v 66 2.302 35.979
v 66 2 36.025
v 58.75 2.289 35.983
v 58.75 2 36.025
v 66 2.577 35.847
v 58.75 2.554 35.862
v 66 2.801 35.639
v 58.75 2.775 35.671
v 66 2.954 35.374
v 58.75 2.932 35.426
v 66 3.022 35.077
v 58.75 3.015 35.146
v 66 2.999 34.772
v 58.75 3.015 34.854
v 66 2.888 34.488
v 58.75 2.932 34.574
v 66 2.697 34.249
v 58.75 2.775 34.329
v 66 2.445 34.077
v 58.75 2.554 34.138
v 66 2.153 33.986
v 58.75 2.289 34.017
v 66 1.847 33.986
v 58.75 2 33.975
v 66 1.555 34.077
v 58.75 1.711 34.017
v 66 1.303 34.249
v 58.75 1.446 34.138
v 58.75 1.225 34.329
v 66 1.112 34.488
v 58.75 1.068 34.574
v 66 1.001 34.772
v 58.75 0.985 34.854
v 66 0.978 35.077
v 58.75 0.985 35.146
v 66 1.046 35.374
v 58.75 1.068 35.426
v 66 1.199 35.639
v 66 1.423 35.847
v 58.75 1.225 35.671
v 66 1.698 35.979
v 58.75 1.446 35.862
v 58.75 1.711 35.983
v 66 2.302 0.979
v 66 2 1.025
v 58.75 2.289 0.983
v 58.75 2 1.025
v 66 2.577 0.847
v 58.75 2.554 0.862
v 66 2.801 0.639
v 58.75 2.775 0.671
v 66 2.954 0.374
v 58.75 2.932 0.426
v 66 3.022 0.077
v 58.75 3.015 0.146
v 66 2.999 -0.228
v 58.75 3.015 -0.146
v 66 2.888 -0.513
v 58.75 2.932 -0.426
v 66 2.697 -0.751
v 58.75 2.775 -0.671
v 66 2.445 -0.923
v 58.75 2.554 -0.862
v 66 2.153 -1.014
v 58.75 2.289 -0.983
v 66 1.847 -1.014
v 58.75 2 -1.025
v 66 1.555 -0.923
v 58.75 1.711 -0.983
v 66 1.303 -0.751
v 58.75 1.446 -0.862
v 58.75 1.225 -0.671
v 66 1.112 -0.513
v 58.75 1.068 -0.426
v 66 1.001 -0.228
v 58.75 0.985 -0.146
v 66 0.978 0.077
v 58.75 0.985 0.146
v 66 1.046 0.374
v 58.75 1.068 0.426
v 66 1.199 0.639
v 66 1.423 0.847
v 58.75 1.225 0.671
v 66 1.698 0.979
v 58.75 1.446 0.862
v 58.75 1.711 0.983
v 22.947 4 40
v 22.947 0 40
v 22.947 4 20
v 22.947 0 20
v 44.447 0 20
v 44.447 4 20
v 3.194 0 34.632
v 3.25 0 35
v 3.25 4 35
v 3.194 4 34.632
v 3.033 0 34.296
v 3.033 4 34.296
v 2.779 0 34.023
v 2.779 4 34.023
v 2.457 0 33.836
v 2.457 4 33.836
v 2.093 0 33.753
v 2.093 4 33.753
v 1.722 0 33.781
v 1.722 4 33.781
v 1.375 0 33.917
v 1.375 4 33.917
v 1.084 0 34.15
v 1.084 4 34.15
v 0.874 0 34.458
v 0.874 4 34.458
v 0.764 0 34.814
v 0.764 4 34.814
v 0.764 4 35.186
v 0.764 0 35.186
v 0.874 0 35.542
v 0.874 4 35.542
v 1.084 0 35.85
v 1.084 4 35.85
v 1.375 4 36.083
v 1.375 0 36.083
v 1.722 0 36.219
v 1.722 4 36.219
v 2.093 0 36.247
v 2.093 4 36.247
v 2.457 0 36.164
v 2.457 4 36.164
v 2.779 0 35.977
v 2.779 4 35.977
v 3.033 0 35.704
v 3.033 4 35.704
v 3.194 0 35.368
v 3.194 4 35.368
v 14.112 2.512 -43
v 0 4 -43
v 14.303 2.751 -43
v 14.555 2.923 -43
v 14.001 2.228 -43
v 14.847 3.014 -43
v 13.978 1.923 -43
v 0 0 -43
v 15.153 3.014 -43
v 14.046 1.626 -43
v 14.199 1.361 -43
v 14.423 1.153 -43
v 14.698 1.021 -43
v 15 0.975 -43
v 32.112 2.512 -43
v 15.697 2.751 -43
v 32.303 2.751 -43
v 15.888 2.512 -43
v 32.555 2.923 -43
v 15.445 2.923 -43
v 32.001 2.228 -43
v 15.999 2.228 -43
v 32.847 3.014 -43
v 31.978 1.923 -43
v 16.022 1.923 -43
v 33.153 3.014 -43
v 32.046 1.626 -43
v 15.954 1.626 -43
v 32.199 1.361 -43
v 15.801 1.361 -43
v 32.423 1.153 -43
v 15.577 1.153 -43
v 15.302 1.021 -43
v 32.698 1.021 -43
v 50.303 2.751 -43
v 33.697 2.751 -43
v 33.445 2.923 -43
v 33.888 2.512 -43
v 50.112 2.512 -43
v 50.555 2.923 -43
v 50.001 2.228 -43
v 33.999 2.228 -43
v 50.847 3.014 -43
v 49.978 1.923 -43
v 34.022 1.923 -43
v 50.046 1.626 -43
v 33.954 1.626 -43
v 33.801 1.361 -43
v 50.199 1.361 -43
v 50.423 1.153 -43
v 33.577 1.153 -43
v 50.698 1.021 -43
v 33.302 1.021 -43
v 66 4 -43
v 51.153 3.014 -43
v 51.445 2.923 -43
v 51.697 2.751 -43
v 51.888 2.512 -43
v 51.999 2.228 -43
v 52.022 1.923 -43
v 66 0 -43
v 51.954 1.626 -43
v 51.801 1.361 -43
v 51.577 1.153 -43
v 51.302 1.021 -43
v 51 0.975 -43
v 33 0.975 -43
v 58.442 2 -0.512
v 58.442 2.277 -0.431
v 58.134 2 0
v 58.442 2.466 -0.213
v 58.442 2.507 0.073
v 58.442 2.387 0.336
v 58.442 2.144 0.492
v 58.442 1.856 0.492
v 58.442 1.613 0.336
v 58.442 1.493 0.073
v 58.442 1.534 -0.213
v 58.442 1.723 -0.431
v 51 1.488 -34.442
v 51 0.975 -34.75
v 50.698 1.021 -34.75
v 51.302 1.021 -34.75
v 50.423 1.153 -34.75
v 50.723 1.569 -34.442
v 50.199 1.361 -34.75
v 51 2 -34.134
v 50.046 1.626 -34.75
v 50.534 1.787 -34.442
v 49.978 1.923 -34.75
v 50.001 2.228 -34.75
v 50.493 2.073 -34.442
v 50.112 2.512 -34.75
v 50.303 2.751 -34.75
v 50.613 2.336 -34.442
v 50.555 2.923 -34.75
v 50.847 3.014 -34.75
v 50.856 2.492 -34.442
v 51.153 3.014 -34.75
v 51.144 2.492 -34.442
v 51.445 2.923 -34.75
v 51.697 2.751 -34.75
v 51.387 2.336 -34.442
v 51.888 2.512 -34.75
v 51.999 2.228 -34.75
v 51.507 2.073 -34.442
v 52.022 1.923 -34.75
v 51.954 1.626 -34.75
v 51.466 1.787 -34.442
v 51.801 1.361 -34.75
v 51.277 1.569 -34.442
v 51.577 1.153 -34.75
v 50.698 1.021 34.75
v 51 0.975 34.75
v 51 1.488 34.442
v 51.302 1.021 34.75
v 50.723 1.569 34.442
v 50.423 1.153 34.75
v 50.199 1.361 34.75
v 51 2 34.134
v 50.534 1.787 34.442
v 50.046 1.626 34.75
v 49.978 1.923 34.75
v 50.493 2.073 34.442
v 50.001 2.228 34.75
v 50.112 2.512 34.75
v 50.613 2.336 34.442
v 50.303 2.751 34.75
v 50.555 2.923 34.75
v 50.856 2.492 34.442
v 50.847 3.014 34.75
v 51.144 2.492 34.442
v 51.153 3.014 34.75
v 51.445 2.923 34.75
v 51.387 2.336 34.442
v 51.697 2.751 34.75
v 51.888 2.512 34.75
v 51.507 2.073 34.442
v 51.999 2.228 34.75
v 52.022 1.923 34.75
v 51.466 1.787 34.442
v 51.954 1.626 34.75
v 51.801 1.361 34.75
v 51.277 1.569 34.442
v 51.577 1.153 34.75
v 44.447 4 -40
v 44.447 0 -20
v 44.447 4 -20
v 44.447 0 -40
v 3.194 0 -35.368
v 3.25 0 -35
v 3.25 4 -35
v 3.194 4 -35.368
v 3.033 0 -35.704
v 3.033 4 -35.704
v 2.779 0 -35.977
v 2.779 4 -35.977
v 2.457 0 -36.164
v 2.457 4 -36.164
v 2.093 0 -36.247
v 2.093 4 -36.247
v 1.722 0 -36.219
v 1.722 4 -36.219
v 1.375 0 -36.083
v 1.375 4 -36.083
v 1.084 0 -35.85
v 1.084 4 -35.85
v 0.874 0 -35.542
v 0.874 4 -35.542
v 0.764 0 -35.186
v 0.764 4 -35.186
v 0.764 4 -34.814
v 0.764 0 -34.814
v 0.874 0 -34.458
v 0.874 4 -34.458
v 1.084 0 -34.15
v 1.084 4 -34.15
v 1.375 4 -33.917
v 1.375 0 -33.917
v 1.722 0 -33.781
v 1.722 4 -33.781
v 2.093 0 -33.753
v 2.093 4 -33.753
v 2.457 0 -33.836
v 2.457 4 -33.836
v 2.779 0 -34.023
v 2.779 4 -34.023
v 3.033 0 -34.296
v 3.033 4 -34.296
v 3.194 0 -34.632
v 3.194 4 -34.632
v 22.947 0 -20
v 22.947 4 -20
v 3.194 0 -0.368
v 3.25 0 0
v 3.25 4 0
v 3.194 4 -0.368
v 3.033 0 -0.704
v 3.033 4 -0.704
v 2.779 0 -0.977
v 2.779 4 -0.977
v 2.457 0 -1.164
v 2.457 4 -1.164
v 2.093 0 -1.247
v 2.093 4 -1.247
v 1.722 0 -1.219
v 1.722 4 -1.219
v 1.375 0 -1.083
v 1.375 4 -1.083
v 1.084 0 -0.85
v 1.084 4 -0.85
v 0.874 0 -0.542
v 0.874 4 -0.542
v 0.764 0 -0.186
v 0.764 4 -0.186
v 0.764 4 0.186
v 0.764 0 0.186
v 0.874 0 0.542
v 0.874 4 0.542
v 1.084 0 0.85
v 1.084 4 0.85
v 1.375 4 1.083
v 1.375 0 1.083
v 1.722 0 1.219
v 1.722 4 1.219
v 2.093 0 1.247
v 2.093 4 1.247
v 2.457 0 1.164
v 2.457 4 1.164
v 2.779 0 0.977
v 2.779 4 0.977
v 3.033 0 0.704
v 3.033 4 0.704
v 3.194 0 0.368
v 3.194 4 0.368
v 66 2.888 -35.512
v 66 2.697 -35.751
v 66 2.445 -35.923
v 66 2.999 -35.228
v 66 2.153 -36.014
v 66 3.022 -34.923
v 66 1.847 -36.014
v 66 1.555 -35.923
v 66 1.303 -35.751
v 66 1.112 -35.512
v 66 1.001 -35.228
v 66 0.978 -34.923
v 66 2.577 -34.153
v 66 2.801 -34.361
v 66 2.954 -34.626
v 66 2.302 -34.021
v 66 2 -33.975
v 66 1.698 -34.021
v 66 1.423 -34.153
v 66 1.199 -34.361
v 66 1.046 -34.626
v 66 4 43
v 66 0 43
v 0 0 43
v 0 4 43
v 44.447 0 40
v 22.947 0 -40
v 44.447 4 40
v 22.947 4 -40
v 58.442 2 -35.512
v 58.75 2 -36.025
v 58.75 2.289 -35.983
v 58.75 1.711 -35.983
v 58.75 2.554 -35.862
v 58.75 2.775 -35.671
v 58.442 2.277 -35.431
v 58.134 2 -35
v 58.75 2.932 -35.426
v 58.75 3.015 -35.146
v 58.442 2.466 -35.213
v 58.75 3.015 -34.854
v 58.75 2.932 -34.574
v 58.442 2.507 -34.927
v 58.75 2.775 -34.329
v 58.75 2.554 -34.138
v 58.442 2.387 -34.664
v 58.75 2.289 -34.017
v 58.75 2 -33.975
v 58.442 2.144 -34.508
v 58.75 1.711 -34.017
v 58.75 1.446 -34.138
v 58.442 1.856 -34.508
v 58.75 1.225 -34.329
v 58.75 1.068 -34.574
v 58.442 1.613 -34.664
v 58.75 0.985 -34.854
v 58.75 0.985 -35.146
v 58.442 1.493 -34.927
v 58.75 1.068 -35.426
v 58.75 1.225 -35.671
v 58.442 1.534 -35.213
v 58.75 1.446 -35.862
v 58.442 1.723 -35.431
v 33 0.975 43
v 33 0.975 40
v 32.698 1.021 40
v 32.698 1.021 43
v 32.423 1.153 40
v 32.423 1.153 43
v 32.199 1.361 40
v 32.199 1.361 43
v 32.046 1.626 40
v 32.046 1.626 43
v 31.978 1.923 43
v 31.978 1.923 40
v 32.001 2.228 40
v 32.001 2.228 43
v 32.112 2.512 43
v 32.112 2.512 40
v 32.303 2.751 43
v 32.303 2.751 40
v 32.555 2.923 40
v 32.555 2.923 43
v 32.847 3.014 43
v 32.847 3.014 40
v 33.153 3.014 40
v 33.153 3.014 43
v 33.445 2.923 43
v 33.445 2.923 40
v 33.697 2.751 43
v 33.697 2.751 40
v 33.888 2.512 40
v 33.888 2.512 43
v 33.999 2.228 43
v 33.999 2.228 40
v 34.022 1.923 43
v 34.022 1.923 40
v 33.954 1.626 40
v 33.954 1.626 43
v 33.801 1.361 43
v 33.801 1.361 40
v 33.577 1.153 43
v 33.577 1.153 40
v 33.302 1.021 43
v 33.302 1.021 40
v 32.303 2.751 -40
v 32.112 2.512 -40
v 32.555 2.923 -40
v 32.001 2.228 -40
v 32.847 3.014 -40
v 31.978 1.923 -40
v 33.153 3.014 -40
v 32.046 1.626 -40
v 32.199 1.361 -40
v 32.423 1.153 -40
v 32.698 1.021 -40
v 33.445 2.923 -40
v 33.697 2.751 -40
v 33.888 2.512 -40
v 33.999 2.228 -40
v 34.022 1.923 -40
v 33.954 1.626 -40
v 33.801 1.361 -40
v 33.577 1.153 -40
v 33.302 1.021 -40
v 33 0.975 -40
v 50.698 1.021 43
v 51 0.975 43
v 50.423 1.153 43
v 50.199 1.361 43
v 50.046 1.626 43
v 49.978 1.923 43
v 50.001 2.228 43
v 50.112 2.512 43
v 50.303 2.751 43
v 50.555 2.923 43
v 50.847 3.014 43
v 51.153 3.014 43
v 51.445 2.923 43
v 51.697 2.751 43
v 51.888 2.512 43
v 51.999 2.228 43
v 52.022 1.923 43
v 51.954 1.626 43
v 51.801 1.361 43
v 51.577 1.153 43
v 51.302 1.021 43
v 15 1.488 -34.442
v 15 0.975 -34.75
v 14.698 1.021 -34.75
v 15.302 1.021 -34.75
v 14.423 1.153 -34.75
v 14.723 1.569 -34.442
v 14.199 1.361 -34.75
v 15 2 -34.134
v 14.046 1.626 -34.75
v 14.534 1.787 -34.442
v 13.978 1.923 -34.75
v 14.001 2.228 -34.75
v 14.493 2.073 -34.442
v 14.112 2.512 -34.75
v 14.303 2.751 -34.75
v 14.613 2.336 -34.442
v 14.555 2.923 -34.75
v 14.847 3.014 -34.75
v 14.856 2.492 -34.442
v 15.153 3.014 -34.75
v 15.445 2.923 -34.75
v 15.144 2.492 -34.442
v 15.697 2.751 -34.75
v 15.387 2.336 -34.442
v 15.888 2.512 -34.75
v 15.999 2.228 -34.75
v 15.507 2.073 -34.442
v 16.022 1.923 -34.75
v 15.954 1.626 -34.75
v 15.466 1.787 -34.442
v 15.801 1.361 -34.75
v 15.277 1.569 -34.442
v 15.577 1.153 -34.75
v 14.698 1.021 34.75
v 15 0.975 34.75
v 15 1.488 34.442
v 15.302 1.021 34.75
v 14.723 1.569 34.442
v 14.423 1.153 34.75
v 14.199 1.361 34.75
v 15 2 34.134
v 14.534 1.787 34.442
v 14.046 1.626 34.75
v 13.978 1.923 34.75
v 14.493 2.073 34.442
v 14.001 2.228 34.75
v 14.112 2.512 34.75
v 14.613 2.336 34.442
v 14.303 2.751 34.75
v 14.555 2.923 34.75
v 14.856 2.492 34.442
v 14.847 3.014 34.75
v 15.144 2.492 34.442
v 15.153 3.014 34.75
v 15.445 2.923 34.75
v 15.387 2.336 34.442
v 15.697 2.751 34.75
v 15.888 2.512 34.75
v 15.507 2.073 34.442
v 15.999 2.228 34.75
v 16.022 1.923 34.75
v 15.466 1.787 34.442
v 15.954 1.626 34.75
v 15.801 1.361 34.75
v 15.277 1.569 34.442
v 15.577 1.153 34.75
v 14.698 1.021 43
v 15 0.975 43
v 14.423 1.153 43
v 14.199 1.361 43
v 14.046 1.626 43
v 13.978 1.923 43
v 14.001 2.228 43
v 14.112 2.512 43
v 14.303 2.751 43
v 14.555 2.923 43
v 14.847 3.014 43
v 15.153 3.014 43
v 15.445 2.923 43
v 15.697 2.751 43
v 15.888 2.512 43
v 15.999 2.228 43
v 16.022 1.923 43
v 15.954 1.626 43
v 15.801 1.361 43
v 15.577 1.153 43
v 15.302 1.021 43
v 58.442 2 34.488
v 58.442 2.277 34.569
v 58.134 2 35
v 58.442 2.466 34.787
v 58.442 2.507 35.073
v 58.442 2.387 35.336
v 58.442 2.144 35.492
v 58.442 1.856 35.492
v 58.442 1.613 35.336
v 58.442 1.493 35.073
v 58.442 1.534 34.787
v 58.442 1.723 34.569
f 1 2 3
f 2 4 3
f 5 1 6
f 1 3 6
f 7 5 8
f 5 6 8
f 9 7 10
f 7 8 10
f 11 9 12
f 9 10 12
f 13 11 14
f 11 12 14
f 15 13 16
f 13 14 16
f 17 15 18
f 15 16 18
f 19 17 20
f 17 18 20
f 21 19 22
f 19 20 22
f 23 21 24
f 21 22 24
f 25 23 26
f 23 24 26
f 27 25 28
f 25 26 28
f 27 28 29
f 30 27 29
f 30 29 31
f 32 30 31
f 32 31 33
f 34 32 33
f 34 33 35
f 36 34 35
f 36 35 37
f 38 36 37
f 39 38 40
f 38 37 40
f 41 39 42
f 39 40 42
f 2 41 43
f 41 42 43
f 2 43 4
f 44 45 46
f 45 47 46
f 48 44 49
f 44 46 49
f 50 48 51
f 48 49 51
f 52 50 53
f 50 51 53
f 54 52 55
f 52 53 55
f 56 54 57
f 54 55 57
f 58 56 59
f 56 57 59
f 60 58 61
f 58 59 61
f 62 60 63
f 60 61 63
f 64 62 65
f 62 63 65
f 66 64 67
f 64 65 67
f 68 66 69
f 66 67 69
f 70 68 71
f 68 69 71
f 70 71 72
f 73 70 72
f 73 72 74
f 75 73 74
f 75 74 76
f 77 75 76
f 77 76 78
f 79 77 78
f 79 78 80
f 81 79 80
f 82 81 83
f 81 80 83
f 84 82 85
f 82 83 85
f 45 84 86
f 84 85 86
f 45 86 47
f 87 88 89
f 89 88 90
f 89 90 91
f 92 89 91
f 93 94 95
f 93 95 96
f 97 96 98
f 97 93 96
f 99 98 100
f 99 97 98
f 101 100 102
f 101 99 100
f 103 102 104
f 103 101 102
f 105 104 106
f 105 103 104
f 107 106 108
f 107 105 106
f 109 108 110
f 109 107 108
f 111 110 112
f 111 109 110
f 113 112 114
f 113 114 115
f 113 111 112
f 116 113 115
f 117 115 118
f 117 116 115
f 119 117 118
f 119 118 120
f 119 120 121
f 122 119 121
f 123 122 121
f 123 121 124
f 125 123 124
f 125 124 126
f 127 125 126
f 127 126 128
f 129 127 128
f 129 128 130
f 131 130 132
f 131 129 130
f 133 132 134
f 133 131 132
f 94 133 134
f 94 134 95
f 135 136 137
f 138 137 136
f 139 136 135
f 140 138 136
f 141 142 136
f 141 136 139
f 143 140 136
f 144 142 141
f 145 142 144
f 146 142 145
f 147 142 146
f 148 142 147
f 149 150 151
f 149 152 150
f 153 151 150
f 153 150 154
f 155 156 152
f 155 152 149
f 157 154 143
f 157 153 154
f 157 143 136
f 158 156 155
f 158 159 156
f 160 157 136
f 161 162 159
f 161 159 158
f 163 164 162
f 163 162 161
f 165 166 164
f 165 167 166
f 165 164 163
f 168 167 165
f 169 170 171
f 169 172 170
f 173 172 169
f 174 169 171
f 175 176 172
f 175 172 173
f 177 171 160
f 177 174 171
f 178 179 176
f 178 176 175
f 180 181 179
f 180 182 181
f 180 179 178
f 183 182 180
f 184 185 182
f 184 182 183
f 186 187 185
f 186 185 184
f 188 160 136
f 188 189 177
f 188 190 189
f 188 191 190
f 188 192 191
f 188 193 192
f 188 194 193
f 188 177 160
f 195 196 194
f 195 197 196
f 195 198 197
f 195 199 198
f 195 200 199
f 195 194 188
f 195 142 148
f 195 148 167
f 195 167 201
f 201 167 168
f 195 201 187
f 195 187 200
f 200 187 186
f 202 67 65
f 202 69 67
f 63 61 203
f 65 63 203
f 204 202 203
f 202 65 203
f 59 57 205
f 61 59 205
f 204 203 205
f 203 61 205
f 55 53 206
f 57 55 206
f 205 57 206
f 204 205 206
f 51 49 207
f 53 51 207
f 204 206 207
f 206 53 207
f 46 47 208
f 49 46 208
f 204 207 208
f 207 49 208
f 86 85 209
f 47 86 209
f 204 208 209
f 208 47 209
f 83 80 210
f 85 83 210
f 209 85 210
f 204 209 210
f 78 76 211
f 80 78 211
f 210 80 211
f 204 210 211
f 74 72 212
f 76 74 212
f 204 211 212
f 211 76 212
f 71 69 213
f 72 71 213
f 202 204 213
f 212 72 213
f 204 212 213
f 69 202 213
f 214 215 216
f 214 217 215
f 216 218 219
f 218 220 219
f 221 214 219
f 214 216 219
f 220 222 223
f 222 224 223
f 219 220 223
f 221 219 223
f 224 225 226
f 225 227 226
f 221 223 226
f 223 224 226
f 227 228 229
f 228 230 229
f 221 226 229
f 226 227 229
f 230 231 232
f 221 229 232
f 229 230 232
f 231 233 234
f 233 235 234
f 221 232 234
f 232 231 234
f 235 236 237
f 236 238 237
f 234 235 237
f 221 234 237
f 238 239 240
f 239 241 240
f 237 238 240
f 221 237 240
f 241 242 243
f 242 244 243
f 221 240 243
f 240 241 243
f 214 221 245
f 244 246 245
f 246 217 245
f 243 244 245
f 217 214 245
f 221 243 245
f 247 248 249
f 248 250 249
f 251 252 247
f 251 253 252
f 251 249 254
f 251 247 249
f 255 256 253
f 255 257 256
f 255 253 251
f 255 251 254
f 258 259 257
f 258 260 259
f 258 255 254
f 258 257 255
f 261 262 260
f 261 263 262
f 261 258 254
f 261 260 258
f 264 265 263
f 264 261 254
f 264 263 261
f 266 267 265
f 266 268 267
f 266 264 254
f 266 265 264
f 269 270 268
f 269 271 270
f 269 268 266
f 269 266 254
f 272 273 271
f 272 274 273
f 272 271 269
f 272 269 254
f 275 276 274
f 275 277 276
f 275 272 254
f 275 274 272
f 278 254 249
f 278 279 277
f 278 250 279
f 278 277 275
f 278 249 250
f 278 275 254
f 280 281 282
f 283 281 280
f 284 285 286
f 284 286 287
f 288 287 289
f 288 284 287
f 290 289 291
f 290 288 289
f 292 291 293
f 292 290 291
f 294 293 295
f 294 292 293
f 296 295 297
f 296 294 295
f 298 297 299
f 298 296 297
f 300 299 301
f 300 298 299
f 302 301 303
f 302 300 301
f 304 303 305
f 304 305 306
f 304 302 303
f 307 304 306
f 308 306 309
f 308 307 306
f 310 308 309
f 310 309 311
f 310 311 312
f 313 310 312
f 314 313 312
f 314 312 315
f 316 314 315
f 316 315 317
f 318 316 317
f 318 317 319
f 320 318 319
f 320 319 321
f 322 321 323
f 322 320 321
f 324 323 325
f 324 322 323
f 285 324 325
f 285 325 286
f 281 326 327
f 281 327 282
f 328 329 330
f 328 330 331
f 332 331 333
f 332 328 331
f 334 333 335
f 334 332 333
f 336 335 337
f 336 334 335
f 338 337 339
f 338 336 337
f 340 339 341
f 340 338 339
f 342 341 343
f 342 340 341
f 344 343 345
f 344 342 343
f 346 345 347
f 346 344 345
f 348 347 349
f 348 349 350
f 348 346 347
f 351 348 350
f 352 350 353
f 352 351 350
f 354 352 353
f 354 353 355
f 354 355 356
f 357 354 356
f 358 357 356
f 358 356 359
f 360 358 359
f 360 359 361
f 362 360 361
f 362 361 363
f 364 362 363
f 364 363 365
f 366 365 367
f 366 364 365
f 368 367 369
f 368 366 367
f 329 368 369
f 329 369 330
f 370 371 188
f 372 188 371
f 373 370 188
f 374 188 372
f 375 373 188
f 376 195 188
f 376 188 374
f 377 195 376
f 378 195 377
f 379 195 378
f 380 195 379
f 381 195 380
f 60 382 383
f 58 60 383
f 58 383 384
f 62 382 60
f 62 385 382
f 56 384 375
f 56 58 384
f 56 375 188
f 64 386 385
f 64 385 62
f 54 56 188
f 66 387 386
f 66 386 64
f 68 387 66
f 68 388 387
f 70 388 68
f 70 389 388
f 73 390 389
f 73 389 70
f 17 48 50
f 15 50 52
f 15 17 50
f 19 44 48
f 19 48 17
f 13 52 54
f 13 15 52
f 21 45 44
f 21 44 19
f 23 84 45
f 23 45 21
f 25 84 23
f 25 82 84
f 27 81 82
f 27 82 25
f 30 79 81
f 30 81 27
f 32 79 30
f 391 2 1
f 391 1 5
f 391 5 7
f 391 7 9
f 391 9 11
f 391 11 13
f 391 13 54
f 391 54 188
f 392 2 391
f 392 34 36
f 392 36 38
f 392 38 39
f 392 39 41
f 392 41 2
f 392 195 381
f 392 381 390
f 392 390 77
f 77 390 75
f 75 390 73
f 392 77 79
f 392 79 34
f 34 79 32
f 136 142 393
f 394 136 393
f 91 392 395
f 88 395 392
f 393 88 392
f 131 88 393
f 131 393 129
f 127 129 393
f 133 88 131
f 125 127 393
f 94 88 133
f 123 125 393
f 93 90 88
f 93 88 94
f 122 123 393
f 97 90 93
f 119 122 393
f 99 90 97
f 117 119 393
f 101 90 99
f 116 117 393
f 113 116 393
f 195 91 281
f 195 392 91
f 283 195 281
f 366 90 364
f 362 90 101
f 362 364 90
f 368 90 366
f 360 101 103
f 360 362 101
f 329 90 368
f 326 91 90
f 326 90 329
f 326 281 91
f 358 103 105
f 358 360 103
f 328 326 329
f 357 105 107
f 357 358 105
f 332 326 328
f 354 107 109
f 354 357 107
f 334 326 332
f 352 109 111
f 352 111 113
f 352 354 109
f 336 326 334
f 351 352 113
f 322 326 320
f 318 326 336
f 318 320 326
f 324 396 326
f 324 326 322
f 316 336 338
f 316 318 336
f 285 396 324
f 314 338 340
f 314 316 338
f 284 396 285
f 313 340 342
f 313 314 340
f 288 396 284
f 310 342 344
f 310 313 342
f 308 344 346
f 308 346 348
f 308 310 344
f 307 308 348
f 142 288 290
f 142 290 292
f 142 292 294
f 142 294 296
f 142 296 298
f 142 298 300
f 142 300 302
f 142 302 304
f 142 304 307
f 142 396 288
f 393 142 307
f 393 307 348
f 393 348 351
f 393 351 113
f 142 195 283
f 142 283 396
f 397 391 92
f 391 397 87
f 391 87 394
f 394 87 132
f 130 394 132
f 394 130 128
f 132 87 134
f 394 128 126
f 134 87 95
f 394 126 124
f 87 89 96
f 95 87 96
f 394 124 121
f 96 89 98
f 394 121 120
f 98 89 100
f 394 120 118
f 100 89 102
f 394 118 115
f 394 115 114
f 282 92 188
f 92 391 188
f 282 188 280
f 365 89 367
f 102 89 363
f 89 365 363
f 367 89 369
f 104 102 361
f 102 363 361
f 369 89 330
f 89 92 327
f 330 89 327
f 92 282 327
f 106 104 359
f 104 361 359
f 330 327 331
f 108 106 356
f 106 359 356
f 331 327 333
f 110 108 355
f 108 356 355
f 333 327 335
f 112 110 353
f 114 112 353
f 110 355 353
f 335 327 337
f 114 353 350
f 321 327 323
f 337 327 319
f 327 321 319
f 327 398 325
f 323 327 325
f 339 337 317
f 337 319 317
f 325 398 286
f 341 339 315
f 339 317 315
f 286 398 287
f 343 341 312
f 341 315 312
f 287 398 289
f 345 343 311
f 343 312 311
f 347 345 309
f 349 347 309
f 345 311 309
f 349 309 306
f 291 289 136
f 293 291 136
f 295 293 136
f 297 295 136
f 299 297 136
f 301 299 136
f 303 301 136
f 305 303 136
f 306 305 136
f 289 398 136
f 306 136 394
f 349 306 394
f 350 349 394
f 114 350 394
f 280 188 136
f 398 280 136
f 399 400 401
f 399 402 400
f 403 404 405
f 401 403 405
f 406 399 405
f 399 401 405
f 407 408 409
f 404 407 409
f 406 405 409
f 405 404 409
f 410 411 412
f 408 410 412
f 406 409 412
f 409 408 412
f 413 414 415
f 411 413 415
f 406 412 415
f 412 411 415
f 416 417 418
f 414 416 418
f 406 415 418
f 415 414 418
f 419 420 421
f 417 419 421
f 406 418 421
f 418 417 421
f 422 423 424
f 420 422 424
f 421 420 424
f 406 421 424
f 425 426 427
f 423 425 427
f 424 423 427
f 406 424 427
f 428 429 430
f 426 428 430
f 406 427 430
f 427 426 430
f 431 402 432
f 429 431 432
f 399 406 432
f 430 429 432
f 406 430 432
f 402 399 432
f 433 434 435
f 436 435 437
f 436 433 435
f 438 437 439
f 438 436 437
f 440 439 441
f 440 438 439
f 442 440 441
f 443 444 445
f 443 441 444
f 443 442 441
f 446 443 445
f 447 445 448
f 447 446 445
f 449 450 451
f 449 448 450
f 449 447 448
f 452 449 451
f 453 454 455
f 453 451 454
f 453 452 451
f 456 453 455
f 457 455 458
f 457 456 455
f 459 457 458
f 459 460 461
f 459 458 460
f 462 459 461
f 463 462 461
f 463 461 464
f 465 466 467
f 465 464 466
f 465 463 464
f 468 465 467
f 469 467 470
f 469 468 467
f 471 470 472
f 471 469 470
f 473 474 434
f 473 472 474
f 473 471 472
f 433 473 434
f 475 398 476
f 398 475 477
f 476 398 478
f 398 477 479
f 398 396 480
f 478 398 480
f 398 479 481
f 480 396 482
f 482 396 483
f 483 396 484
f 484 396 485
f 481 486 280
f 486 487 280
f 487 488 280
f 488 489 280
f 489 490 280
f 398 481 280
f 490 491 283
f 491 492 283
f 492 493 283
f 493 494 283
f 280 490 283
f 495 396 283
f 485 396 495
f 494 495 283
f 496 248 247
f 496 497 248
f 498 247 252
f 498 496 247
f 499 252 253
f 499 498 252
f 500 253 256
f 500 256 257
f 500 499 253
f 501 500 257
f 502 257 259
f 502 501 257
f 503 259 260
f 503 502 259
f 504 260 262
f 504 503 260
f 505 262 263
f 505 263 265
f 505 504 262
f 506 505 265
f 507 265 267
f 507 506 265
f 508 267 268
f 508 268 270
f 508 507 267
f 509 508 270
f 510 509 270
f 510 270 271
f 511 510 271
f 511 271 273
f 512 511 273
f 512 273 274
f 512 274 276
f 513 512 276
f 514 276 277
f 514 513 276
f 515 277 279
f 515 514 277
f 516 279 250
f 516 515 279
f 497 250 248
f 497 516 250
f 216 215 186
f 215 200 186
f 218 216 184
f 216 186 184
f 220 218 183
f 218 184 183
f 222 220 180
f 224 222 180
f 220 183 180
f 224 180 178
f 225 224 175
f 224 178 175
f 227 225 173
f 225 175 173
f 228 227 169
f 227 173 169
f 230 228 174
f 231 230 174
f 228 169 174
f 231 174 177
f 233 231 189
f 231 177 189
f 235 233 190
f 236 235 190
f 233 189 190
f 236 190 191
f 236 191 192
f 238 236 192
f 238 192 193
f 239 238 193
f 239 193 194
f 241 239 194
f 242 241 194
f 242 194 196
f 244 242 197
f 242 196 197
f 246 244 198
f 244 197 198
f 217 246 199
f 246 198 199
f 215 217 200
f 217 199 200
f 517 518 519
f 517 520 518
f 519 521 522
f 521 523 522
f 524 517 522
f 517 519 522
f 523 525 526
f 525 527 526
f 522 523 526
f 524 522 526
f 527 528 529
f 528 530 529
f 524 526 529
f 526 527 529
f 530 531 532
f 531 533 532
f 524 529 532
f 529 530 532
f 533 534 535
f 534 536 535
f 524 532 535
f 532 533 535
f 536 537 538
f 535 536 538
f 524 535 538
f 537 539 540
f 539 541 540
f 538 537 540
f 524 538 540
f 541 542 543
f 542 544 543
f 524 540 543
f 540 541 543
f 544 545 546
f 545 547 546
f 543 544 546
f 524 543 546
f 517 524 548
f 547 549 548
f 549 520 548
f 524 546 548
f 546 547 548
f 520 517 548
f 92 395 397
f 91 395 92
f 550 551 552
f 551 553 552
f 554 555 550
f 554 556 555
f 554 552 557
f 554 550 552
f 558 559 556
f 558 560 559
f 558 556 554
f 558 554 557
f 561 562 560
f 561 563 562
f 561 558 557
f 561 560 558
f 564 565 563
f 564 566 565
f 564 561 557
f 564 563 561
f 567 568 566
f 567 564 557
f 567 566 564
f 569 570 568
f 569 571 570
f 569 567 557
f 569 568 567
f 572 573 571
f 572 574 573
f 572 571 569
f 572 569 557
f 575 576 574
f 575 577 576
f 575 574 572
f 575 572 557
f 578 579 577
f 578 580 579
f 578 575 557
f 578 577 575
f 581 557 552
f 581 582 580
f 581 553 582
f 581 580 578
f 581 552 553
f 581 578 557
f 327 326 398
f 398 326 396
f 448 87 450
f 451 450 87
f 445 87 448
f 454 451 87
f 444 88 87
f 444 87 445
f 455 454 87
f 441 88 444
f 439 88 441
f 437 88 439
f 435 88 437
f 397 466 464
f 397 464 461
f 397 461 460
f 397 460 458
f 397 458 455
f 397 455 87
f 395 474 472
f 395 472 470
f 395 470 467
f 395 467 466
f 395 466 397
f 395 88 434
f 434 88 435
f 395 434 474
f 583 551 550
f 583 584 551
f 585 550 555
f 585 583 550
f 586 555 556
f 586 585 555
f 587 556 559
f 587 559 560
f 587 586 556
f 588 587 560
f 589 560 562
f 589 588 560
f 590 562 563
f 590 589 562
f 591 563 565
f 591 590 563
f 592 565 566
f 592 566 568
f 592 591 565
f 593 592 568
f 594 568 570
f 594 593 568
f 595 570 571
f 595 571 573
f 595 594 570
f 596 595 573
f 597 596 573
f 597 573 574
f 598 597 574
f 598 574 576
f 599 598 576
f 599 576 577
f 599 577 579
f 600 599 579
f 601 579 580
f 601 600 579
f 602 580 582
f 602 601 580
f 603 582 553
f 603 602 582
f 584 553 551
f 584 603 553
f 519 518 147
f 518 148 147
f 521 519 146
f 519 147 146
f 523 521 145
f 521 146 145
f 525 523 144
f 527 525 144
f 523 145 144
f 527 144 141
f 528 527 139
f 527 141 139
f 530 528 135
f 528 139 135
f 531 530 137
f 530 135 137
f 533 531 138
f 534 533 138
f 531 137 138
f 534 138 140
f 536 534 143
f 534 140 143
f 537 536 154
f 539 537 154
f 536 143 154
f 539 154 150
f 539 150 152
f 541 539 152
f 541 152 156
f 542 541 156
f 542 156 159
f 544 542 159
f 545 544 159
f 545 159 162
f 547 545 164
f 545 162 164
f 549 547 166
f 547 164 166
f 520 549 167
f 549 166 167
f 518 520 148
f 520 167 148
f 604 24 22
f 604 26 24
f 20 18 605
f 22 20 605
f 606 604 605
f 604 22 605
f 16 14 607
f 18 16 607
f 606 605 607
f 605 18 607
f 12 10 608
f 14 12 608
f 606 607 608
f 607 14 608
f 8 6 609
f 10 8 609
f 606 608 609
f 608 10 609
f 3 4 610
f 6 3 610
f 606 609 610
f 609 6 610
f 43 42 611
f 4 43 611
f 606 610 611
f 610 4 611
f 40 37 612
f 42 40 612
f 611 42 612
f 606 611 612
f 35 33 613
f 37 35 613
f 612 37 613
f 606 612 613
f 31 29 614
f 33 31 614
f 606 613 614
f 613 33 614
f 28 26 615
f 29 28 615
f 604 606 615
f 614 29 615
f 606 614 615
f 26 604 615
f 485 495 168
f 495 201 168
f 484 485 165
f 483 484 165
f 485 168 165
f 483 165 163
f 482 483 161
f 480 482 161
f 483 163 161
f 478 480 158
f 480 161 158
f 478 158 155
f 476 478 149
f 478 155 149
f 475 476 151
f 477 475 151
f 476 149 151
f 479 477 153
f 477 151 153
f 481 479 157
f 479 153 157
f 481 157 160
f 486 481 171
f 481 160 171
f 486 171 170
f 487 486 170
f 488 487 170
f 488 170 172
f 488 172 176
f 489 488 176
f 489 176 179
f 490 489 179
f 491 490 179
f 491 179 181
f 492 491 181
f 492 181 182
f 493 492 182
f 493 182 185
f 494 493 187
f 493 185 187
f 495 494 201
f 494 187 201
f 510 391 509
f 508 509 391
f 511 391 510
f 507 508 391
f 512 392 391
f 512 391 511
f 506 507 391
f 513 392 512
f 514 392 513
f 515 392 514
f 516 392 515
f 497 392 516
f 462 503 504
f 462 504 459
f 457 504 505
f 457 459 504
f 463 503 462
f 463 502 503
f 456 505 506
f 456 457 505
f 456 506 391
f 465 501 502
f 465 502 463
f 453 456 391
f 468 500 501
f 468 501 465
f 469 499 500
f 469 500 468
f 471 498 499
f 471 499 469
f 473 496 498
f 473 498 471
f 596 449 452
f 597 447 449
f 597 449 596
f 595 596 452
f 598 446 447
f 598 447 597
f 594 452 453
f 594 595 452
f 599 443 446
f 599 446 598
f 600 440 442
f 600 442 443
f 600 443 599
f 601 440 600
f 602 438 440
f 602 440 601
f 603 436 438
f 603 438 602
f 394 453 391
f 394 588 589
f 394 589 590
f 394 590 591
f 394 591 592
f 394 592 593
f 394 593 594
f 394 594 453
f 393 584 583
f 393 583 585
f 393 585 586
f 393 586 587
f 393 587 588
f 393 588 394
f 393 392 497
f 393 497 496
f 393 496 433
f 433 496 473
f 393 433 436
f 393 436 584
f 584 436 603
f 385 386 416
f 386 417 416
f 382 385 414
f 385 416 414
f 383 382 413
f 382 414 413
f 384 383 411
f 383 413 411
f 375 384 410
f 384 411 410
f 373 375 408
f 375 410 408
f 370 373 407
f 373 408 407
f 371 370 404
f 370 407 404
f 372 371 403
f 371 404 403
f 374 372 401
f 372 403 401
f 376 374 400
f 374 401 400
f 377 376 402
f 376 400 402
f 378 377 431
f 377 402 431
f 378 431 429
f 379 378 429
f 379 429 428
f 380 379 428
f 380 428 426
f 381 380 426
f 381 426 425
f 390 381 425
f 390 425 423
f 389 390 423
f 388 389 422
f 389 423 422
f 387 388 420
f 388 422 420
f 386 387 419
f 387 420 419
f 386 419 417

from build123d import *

# Parameters (mm, degrees)
SKETCH_1_R                    = 1.25
EXTRUDE_1_DEPTH               = 4
SKETCH_2_W                    = 21.5
SKETCH_2_H                    = 20
CUT_EXTRUDE_1_DEPTH           = 8
HOLE_WIZARD_M2_5_1_AT_2_COUNT = 2
HOLE_WIZARD_M2_5_1_AT_2_PITCH = 18
HOLE_WIZARD_M2_5_1_AT_3_COUNT = 2
HOLE_WIZARD_M2_5_1_AT_3_PITCH = 36
HOLE_WIZARD_M2_5_2_D          = 2.05
HOLE_WIZARD_M2_5_2_DEPTH      = 7.25
HOLE_WIZARD_M2_5_2_TIP        = 0.615882135


with BuildPart() as part:
    # 草图1 → 凸台-拉伸1 (new body)
    with BuildSketch(Plane(origin=(0, 0, 0), x_dir=(1, 0, 0), z_dir=(0, 1, 0))):
        Polygon((0, 0), (0, 43), (66, 43), (66, -43), (0, -43), align=None)
        with Locations((2, 0)):
            Circle(SKETCH_1_R, mode=Mode.SUBTRACT)
        with Locations((2, 35)):
            Circle(SKETCH_1_R, mode=Mode.SUBTRACT)
        with Locations((2, -35)):
            Circle(SKETCH_1_R, mode=Mode.SUBTRACT)
    extrude(amount=EXTRUDE_1_DEPTH)

    # 草图2 → 切除-拉伸1 (cut)
    with BuildSketch(Plane(origin=(0, 0, 0), x_dir=(1, 0, 0), z_dir=(0, 1, 0))):
        with Locations((33.697153025, -30)):
            Rectangle(SKETCH_2_W, SKETCH_2_H)
        with Locations((33.697153025, 30)):
            Rectangle(SKETCH_2_W, SKETCH_2_H)
    extrude(amount=CUT_EXTRUDE_1_DEPTH, mode=Mode.SUBTRACT)

    # 草图6 → M2.5 螺纹孔1 (revolve, cut)
    with BuildSketch(Plane(origin=(15, 2, 43), x_dir=(0, -1, 0), z_dir=(1, 0, 0))):
        Polygon((0, 0), (0, 8.865882135), (1.025, 8.25), (1.025, 0), align=None)
    hole_wizard_m2_5_1 = revolve(axis=Axis((15, 2, 49.35), (0, 0, -1)), mode=Mode.SUBTRACT)

    # M2.5 螺纹孔1 at 2: M2.5 螺纹孔1 ×2
    with Locations(*[(i * HOLE_WIZARD_M2_5_1_AT_2_PITCH, 0, 0) for i in range(1, HOLE_WIZARD_M2_5_1_AT_2_COUNT)]):
        add(hole_wizard_m2_5_1, mode=Mode.SUBTRACT)

    # M2.5 螺纹孔1 at 3: M2.5 螺纹孔1 ×2
    with Locations(*[(i * HOLE_WIZARD_M2_5_1_AT_3_PITCH, 0, 0) for i in range(1, HOLE_WIZARD_M2_5_1_AT_3_COUNT)]):
        add(hole_wizard_m2_5_1, mode=Mode.SUBTRACT)

    # 镜向1: M2.5 螺纹孔1 across plane
    add(hole_wizard_m2_5_1.mirror(Plane.XY), mode=Mode.SUBTRACT)

    # 镜向1 copy 1 sketch → 镜向1 copy 1 (revolve, cut)
    with BuildSketch(Plane(origin=(33, 2, -43), x_dir=(0, -1, 0), z_dir=(1, 0, 0))):
        Polygon((0, 0), (0, -8.865882135), (1.025, -8.25), (1.025, 0), align=None)
    revolve(axis=Axis((33, 2, -49.35), (0, 0, -1)), mode=Mode.SUBTRACT)

    # 镜向1 copy 2 sketch → 镜向1 copy 2 (revolve, cut)
    with BuildSketch(Plane(origin=(51, 2, -43), x_dir=(0, -1, 0), z_dir=(1, 0, 0))):
        Polygon((0, 0), (0, -8.865882135), (1.025, -8.25), (1.025, 0), align=None)
    revolve(axis=Axis((51, 2, -49.35), (0, 0, -1)), mode=Mode.SUBTRACT)

    # M2.5 螺纹孔2
    with Locations(Plane(origin=(66, 0, 0), x_dir=(0, 0, -1), z_dir=(1, 0, 0))):
        with Locations((0, 2), (-35, 2), (35, 2)):
            Hole(HOLE_WIZARD_M2_5_2_D / 2, depth=HOLE_WIZARD_M2_5_2_DEPTH)
            with Locations((0, 0, -(HOLE_WIZARD_M2_5_2_DEPTH + HOLE_WIZARD_M2_5_2_TIP / 2))):  # 118° drill point
                Cone(0, HOLE_WIZARD_M2_5_2_D / 2, HOLE_WIZARD_M2_5_2_TIP, mode=Mode.SUBTRACT)


solid = part.part
